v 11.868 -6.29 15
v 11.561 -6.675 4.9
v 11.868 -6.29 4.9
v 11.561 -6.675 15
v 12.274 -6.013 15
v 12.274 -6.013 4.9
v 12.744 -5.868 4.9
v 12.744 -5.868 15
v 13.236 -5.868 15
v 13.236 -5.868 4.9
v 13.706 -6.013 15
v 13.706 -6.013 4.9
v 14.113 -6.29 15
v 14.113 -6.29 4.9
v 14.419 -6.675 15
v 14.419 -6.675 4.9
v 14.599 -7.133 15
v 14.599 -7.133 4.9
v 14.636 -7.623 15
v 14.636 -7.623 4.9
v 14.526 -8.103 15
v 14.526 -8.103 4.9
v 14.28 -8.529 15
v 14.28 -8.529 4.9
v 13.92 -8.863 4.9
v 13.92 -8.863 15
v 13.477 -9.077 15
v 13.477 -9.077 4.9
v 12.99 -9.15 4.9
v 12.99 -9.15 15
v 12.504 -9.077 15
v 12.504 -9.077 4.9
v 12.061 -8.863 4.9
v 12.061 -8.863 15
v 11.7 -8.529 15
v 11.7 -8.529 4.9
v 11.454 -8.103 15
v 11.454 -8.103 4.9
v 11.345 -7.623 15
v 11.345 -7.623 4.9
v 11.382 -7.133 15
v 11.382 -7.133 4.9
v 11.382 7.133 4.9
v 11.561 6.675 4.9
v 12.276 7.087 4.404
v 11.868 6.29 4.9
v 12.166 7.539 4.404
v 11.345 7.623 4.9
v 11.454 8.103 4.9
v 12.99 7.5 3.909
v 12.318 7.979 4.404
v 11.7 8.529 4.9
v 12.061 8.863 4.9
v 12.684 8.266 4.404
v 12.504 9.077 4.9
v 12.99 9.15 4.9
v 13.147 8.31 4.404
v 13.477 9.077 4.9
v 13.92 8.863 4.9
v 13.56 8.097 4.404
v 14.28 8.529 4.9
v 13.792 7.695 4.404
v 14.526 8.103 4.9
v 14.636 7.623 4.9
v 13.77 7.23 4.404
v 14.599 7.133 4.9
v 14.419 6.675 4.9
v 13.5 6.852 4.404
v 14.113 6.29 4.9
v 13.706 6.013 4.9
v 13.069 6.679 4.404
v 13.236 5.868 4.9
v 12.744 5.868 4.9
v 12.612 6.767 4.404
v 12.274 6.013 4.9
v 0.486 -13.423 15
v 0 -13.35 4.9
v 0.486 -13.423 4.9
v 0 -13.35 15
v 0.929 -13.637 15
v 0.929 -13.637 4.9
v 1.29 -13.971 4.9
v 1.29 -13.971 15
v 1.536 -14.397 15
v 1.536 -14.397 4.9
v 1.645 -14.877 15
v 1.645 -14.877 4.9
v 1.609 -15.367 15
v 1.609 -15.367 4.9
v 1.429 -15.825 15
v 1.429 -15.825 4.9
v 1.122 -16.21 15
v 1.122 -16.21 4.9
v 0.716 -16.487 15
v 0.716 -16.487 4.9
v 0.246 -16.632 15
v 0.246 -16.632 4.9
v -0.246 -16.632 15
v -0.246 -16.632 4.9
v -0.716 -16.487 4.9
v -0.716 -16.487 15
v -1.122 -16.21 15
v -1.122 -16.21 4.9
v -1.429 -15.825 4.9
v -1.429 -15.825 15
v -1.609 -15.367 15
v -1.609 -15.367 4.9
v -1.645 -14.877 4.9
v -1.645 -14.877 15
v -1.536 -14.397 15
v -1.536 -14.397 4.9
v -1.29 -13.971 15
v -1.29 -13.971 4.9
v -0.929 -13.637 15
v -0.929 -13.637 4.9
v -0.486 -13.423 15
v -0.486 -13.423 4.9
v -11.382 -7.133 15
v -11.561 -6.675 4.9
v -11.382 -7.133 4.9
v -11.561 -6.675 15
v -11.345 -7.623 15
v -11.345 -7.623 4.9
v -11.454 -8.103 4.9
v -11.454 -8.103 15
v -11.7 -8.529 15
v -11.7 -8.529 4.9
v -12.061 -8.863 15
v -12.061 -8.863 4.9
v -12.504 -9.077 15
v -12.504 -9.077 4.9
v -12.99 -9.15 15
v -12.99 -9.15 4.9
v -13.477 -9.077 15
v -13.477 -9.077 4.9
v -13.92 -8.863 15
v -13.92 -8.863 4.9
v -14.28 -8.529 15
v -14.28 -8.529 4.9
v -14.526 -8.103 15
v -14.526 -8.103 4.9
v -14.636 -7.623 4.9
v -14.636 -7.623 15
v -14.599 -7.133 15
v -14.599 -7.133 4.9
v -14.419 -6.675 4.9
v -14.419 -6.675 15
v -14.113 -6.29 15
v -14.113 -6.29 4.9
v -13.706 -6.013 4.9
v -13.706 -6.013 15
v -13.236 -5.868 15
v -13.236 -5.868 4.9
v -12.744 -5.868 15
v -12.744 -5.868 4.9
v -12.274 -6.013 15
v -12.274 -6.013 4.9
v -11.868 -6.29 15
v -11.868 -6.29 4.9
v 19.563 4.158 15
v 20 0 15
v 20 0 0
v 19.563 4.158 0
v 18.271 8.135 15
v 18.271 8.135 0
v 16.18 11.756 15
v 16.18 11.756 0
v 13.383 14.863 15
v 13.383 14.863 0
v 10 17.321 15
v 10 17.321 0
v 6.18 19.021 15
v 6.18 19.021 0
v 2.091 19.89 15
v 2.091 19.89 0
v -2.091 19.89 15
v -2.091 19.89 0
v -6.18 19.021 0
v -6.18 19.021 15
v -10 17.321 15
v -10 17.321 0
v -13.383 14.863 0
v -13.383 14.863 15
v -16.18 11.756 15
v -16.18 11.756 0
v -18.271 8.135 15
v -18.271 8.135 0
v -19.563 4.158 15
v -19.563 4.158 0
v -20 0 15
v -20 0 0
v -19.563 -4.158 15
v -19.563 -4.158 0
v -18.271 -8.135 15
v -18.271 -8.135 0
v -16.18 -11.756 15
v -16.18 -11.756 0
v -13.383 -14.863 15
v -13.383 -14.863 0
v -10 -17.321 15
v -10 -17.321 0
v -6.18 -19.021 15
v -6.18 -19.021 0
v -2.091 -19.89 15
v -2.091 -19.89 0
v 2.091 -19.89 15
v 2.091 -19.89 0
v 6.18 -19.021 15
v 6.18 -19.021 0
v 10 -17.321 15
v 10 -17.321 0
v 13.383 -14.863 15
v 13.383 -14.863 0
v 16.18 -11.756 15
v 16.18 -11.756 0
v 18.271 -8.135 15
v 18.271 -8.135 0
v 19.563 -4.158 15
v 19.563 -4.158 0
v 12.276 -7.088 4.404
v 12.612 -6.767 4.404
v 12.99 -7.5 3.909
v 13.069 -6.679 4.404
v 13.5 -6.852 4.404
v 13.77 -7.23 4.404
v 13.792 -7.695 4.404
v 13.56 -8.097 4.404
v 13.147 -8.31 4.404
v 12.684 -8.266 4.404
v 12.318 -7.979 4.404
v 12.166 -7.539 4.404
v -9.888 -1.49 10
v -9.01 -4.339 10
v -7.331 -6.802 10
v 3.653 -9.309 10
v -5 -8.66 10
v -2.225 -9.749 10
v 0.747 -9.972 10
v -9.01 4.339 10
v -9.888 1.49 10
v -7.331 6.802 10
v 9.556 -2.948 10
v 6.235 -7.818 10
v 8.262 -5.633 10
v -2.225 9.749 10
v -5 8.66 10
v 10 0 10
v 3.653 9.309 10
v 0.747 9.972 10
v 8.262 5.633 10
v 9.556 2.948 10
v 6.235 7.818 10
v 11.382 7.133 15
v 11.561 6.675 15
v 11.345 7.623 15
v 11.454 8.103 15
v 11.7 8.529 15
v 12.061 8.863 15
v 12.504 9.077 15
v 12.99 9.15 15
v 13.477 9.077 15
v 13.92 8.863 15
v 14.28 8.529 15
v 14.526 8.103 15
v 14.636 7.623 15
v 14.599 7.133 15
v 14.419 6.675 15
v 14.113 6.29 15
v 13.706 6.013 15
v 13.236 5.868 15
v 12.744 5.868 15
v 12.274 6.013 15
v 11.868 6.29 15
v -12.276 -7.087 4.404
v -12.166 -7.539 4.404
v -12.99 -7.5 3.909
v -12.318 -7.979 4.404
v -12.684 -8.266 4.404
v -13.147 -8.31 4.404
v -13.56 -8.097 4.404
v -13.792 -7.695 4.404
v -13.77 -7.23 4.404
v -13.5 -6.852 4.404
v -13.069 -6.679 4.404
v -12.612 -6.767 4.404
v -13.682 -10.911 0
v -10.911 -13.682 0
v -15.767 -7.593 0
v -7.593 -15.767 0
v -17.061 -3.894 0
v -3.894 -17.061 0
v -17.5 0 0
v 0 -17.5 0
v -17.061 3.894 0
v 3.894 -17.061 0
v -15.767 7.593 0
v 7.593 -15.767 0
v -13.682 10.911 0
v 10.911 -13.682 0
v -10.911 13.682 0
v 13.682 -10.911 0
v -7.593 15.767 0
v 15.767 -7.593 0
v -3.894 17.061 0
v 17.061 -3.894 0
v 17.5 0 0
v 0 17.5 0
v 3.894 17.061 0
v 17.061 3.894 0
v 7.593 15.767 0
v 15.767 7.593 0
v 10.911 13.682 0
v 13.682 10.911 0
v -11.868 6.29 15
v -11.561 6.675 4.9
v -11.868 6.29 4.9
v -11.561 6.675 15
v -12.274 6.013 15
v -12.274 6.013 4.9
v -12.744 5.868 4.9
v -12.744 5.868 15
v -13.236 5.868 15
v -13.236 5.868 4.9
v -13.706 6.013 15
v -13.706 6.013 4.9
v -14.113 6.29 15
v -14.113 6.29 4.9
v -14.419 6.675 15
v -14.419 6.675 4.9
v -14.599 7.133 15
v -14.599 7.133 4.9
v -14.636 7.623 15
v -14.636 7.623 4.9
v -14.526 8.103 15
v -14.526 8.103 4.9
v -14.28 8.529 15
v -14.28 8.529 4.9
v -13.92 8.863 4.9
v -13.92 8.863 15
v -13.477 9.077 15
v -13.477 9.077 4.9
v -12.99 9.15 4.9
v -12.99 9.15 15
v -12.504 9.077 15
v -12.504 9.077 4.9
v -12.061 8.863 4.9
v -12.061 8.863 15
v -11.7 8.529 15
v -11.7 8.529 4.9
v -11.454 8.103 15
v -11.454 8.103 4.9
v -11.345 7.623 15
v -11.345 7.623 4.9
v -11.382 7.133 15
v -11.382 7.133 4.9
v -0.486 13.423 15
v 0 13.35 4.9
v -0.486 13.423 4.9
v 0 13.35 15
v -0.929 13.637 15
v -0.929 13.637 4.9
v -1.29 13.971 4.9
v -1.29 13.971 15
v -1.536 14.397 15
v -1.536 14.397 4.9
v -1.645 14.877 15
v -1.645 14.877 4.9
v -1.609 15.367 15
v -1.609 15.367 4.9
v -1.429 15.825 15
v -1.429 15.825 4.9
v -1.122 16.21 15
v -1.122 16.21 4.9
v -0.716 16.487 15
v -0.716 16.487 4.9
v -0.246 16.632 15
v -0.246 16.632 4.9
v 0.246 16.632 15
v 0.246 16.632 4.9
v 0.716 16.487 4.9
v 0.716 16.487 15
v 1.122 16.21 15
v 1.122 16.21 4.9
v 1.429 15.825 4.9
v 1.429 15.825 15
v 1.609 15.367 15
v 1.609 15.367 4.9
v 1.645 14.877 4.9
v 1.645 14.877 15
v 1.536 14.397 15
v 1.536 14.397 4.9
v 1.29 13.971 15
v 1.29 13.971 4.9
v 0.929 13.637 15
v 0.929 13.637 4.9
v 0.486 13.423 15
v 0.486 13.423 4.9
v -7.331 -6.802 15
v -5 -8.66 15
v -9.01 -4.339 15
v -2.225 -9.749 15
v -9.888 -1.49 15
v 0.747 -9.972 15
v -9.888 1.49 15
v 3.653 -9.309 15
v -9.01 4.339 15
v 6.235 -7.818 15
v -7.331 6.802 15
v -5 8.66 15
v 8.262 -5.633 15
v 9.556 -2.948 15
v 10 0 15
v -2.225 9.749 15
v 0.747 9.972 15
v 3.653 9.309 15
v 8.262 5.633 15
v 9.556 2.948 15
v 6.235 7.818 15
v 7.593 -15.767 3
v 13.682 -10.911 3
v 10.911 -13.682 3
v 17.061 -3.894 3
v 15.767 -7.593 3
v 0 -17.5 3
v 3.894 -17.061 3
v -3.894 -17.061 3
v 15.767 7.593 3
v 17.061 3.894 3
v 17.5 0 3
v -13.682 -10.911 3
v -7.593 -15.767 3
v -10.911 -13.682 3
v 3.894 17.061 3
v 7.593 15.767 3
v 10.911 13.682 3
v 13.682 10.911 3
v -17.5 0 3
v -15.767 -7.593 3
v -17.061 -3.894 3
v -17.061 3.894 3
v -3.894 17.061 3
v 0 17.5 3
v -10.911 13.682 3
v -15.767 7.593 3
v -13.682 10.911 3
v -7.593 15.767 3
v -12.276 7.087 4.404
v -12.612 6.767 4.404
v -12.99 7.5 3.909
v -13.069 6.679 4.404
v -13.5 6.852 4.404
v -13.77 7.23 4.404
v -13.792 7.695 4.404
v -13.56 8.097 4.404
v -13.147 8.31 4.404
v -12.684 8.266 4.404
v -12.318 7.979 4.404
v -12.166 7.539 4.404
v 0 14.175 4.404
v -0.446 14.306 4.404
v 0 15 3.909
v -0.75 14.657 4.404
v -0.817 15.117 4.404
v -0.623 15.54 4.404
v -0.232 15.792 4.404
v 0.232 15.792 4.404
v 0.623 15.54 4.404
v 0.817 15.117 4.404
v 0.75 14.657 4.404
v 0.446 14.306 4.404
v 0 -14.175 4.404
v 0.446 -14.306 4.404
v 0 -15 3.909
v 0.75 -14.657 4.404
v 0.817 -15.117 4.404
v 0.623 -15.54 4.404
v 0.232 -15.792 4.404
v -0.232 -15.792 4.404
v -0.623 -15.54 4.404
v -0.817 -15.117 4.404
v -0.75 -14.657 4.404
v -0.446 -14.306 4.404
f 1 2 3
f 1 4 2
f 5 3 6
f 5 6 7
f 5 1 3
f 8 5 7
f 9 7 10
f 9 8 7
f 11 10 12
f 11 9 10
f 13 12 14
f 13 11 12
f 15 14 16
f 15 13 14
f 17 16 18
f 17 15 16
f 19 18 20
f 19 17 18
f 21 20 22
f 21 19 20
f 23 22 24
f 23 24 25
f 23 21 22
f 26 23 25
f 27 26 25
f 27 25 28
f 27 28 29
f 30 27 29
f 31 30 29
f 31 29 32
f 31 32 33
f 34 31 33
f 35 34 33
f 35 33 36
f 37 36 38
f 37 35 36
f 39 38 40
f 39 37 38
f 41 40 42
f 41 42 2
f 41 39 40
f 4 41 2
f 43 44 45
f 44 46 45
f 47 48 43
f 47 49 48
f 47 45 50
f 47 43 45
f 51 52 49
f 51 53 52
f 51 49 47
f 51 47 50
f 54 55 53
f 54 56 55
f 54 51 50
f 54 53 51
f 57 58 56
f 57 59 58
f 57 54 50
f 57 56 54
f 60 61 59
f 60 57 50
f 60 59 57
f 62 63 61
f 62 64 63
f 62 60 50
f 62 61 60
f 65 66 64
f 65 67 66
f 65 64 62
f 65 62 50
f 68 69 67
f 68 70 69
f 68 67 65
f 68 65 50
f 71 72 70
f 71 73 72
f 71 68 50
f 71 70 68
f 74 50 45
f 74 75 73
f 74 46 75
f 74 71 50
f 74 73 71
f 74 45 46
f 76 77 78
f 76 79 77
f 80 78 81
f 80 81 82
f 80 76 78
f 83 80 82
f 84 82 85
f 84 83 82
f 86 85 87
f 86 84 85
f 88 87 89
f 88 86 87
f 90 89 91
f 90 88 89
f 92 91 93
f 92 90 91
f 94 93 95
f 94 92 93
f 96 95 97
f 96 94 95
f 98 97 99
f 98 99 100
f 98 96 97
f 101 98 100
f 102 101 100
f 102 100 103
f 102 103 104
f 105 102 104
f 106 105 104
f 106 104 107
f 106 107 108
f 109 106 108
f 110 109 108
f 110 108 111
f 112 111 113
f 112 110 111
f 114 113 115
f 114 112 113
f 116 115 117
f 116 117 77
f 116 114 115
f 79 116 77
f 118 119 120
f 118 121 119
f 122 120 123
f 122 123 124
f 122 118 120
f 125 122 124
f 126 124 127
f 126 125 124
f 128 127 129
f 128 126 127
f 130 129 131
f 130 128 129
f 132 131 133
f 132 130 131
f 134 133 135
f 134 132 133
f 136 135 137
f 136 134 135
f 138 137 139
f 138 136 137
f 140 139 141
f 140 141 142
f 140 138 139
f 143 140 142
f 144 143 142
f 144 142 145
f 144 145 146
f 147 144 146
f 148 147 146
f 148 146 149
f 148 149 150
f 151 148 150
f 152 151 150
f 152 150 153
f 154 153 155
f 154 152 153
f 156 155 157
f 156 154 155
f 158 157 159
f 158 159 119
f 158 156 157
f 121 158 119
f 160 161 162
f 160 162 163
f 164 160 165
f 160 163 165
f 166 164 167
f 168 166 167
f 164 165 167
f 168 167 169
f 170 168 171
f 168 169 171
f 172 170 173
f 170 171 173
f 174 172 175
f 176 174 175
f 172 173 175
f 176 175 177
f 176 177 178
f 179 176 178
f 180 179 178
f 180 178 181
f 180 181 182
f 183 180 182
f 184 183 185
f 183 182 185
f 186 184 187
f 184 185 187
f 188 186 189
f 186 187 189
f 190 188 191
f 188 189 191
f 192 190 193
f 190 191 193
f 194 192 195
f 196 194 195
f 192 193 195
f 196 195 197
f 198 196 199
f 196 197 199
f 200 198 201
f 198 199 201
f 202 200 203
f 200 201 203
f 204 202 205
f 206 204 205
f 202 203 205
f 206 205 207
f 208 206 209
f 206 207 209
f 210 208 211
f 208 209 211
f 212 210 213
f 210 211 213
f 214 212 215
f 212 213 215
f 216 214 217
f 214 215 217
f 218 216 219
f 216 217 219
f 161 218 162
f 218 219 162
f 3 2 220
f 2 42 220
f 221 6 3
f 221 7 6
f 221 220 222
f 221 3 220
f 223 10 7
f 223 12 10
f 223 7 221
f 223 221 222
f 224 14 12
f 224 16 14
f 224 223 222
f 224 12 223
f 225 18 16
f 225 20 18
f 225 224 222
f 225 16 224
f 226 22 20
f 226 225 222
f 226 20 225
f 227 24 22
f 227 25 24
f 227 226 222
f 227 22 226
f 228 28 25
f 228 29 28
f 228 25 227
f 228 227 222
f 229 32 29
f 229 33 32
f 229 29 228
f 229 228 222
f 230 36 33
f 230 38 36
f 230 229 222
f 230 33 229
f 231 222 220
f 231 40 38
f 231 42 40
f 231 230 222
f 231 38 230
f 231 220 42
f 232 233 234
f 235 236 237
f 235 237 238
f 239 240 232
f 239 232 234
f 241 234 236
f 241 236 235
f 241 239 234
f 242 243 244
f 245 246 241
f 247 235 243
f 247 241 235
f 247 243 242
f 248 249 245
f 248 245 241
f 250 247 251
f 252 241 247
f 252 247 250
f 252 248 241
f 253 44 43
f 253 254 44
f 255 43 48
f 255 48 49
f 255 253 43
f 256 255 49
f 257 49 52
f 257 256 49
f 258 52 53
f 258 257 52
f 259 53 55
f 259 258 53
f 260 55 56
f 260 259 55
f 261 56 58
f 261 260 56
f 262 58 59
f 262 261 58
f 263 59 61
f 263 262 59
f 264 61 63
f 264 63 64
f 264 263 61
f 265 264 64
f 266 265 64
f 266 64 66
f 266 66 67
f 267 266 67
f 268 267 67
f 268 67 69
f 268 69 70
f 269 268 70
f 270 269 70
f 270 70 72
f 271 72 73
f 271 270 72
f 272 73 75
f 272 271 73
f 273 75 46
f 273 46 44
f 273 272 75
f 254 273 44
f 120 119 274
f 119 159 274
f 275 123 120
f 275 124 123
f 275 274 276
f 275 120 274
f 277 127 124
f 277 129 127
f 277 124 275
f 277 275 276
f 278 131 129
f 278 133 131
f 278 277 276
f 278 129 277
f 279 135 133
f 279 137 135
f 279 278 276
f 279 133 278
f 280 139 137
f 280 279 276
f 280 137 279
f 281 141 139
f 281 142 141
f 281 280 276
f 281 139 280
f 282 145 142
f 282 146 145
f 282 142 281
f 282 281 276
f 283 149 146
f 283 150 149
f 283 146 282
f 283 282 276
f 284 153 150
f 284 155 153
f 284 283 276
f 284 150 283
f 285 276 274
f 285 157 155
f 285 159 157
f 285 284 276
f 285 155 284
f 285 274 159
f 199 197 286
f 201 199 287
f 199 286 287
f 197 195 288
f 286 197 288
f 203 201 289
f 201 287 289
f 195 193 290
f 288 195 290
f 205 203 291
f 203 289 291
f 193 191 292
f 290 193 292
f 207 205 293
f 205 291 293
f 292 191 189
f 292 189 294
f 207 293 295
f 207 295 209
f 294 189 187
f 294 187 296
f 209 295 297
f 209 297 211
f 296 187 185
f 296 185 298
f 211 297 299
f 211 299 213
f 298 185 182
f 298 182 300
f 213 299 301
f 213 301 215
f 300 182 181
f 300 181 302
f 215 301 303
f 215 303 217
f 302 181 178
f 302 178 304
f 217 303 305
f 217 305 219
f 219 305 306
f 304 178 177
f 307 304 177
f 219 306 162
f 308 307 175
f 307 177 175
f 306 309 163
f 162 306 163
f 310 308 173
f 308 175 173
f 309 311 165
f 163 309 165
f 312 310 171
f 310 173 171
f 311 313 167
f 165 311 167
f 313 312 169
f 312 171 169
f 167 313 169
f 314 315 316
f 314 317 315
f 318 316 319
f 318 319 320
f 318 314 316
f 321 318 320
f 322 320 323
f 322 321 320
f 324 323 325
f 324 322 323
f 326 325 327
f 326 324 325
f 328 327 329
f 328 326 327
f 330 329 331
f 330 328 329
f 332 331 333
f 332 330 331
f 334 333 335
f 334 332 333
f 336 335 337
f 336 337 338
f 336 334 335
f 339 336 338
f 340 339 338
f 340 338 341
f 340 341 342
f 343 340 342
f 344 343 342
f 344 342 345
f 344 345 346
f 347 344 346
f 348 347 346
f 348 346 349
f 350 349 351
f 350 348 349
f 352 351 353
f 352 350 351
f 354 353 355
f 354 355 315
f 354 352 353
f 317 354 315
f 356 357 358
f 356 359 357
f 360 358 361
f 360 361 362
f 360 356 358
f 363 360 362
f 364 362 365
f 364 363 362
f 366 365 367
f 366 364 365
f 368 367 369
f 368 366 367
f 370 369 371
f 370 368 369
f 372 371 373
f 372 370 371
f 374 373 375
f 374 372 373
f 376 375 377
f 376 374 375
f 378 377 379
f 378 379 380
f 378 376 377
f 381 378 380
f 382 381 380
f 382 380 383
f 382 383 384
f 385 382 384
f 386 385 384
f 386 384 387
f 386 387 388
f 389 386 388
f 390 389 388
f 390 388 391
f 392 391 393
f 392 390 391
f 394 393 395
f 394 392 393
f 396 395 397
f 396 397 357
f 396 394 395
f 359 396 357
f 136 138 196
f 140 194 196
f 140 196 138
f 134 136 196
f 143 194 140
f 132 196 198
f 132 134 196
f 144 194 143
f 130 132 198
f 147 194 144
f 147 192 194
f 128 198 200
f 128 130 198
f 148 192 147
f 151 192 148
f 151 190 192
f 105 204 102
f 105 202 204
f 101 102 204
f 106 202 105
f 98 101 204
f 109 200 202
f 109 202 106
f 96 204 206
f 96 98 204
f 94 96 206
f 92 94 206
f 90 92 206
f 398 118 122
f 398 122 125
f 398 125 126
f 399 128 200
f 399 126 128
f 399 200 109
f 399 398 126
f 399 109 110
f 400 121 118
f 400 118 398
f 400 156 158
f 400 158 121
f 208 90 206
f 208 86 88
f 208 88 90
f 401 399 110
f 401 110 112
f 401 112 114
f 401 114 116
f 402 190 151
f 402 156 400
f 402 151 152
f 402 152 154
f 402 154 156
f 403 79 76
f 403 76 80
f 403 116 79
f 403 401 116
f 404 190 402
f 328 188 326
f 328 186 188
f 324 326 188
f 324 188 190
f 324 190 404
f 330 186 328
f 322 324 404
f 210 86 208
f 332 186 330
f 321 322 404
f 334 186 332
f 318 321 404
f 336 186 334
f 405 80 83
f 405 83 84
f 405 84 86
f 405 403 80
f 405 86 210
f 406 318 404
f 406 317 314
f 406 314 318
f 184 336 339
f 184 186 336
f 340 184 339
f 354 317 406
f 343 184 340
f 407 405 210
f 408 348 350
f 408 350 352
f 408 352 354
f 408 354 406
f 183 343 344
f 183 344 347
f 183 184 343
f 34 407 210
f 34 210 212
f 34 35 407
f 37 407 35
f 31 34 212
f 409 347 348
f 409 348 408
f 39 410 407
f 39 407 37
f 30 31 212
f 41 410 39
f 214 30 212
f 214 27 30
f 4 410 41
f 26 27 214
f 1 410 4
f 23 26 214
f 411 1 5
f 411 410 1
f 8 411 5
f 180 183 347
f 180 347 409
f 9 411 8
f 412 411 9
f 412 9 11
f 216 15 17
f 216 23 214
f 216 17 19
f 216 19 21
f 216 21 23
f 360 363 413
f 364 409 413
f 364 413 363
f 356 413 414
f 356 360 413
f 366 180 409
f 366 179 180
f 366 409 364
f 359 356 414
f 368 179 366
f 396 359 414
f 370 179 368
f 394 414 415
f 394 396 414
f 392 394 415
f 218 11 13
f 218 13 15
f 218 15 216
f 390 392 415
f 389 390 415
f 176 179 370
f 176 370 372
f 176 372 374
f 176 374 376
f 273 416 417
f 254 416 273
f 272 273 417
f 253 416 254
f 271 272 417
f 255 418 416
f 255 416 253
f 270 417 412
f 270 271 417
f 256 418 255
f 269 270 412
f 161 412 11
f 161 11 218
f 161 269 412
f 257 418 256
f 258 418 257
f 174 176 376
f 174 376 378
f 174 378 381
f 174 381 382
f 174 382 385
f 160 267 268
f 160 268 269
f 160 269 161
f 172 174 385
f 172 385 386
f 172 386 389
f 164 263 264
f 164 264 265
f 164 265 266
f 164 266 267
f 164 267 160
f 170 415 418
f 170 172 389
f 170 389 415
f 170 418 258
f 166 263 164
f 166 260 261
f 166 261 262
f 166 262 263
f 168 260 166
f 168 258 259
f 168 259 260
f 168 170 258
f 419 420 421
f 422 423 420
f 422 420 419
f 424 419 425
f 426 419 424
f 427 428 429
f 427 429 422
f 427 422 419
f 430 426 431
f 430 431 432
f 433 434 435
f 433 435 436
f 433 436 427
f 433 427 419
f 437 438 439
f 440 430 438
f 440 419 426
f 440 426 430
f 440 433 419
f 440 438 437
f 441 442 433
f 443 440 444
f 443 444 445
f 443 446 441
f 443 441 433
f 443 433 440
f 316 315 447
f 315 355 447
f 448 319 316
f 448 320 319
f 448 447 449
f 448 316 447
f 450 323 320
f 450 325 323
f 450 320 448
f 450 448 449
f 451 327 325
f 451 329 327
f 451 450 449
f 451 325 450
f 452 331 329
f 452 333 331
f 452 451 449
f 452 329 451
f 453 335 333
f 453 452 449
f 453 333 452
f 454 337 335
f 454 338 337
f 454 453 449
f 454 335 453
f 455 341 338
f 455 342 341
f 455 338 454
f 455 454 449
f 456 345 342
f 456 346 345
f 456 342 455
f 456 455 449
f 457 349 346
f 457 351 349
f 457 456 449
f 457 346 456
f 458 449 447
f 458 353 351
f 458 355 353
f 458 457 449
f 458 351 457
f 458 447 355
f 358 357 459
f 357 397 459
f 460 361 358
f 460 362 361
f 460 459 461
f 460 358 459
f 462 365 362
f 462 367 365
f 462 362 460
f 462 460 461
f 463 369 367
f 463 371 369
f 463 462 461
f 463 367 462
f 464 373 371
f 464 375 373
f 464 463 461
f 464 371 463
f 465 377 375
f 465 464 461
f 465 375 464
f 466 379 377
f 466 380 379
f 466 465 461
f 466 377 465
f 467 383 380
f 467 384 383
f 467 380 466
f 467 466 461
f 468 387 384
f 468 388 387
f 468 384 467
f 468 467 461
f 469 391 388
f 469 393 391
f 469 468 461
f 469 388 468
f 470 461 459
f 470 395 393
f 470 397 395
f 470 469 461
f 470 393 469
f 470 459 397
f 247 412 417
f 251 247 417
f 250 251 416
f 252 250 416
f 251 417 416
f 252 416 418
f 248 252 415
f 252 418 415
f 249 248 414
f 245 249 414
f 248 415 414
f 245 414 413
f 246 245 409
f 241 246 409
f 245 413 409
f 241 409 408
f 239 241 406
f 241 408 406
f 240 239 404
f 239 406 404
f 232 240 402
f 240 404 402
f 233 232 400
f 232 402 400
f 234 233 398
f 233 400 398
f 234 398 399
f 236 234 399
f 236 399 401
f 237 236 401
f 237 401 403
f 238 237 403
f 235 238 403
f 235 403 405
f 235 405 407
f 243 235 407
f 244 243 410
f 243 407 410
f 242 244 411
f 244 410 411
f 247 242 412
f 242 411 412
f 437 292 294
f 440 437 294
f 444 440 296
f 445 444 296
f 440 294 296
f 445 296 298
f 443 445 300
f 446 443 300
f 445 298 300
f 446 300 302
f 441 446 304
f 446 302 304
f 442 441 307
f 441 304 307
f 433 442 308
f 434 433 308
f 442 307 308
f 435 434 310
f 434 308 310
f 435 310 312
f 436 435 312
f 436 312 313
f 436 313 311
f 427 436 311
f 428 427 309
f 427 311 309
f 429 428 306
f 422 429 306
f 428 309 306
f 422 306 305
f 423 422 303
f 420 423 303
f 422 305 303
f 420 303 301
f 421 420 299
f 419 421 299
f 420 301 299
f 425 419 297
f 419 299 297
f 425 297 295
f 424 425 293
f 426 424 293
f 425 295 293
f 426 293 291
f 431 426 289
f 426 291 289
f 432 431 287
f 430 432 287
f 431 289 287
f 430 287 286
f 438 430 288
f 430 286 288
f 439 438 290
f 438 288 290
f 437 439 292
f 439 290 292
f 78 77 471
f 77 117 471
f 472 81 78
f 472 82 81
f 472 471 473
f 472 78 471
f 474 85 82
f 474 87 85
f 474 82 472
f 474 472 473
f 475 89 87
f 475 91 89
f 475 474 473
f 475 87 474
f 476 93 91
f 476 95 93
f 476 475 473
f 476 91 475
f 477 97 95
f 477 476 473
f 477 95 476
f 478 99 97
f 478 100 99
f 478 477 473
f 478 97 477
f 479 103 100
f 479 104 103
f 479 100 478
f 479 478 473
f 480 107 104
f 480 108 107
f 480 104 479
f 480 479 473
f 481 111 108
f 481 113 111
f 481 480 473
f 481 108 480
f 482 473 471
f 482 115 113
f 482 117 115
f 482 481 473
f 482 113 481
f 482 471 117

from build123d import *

# Parameters (mm, degrees)
SKETCH1_R           = 20
BOSS_EXTRUDE1_DEPTH = 15
SKETCH2_R           = 10
CUT_EXTRUDE1_DEPTH  = 5
CIRPATTERN1_COUNT   = 6
SKETCH5_R           = 17.5
CUT_EXTRUDE3_DEPTH  = 3


with BuildPart() as part:
    # Sketch1 → Boss-Extrude1 (new body)
    with BuildSketch(Plane.XY):
        Circle(SKETCH1_R)
    extrude(amount=BOSS_EXTRUDE1_DEPTH)

    # Sketch2 → Cut-Extrude1 (cut)
    with BuildSketch(Plane.XY.offset(15)):
        Circle(SKETCH2_R)
    extrude(amount=-CUT_EXTRUDE1_DEPTH, mode=Mode.SUBTRACT)

    # Sketch4 → M4x0.7 Tapped Hole1 (revolve, cut)
    with BuildSketch(Plane(origin=(0, 15, 15), x_dir=(0, -1, 0), z_dir=(1, 0, 0))):
        Polygon((0, 0), (0, 11.091420021), (1.65, 10.1), (1.65, 0), align=None)
    m4x0_7_tapped_hole1 = revolve(axis=Axis((0, 15, 21.35), (0, 0, -1)), mode=Mode.SUBTRACT)

    # CirPattern1: M4x0.7 Tapped Hole1 ×6 about axis
    cirpattern1_axis = Axis((0, 0, 0), (0, 0, 1))
    for i in range(1, CIRPATTERN1_COUNT):
        add(m4x0_7_tapped_hole1.rotate(cirpattern1_axis, i * 360 / CIRPATTERN1_COUNT), mode=Mode.SUBTRACT)

    # Sketch5 → Cut-Extrude3 (cut)
    with BuildSketch(Plane(origin=(0, 0, 0), x_dir=(-1, 0, 0), z_dir=(0, 0, -1))):
        Circle(SKETCH5_R)
    extrude(amount=-CUT_EXTRUDE3_DEPTH, mode=Mode.SUBTRACT)


solid = part.part
